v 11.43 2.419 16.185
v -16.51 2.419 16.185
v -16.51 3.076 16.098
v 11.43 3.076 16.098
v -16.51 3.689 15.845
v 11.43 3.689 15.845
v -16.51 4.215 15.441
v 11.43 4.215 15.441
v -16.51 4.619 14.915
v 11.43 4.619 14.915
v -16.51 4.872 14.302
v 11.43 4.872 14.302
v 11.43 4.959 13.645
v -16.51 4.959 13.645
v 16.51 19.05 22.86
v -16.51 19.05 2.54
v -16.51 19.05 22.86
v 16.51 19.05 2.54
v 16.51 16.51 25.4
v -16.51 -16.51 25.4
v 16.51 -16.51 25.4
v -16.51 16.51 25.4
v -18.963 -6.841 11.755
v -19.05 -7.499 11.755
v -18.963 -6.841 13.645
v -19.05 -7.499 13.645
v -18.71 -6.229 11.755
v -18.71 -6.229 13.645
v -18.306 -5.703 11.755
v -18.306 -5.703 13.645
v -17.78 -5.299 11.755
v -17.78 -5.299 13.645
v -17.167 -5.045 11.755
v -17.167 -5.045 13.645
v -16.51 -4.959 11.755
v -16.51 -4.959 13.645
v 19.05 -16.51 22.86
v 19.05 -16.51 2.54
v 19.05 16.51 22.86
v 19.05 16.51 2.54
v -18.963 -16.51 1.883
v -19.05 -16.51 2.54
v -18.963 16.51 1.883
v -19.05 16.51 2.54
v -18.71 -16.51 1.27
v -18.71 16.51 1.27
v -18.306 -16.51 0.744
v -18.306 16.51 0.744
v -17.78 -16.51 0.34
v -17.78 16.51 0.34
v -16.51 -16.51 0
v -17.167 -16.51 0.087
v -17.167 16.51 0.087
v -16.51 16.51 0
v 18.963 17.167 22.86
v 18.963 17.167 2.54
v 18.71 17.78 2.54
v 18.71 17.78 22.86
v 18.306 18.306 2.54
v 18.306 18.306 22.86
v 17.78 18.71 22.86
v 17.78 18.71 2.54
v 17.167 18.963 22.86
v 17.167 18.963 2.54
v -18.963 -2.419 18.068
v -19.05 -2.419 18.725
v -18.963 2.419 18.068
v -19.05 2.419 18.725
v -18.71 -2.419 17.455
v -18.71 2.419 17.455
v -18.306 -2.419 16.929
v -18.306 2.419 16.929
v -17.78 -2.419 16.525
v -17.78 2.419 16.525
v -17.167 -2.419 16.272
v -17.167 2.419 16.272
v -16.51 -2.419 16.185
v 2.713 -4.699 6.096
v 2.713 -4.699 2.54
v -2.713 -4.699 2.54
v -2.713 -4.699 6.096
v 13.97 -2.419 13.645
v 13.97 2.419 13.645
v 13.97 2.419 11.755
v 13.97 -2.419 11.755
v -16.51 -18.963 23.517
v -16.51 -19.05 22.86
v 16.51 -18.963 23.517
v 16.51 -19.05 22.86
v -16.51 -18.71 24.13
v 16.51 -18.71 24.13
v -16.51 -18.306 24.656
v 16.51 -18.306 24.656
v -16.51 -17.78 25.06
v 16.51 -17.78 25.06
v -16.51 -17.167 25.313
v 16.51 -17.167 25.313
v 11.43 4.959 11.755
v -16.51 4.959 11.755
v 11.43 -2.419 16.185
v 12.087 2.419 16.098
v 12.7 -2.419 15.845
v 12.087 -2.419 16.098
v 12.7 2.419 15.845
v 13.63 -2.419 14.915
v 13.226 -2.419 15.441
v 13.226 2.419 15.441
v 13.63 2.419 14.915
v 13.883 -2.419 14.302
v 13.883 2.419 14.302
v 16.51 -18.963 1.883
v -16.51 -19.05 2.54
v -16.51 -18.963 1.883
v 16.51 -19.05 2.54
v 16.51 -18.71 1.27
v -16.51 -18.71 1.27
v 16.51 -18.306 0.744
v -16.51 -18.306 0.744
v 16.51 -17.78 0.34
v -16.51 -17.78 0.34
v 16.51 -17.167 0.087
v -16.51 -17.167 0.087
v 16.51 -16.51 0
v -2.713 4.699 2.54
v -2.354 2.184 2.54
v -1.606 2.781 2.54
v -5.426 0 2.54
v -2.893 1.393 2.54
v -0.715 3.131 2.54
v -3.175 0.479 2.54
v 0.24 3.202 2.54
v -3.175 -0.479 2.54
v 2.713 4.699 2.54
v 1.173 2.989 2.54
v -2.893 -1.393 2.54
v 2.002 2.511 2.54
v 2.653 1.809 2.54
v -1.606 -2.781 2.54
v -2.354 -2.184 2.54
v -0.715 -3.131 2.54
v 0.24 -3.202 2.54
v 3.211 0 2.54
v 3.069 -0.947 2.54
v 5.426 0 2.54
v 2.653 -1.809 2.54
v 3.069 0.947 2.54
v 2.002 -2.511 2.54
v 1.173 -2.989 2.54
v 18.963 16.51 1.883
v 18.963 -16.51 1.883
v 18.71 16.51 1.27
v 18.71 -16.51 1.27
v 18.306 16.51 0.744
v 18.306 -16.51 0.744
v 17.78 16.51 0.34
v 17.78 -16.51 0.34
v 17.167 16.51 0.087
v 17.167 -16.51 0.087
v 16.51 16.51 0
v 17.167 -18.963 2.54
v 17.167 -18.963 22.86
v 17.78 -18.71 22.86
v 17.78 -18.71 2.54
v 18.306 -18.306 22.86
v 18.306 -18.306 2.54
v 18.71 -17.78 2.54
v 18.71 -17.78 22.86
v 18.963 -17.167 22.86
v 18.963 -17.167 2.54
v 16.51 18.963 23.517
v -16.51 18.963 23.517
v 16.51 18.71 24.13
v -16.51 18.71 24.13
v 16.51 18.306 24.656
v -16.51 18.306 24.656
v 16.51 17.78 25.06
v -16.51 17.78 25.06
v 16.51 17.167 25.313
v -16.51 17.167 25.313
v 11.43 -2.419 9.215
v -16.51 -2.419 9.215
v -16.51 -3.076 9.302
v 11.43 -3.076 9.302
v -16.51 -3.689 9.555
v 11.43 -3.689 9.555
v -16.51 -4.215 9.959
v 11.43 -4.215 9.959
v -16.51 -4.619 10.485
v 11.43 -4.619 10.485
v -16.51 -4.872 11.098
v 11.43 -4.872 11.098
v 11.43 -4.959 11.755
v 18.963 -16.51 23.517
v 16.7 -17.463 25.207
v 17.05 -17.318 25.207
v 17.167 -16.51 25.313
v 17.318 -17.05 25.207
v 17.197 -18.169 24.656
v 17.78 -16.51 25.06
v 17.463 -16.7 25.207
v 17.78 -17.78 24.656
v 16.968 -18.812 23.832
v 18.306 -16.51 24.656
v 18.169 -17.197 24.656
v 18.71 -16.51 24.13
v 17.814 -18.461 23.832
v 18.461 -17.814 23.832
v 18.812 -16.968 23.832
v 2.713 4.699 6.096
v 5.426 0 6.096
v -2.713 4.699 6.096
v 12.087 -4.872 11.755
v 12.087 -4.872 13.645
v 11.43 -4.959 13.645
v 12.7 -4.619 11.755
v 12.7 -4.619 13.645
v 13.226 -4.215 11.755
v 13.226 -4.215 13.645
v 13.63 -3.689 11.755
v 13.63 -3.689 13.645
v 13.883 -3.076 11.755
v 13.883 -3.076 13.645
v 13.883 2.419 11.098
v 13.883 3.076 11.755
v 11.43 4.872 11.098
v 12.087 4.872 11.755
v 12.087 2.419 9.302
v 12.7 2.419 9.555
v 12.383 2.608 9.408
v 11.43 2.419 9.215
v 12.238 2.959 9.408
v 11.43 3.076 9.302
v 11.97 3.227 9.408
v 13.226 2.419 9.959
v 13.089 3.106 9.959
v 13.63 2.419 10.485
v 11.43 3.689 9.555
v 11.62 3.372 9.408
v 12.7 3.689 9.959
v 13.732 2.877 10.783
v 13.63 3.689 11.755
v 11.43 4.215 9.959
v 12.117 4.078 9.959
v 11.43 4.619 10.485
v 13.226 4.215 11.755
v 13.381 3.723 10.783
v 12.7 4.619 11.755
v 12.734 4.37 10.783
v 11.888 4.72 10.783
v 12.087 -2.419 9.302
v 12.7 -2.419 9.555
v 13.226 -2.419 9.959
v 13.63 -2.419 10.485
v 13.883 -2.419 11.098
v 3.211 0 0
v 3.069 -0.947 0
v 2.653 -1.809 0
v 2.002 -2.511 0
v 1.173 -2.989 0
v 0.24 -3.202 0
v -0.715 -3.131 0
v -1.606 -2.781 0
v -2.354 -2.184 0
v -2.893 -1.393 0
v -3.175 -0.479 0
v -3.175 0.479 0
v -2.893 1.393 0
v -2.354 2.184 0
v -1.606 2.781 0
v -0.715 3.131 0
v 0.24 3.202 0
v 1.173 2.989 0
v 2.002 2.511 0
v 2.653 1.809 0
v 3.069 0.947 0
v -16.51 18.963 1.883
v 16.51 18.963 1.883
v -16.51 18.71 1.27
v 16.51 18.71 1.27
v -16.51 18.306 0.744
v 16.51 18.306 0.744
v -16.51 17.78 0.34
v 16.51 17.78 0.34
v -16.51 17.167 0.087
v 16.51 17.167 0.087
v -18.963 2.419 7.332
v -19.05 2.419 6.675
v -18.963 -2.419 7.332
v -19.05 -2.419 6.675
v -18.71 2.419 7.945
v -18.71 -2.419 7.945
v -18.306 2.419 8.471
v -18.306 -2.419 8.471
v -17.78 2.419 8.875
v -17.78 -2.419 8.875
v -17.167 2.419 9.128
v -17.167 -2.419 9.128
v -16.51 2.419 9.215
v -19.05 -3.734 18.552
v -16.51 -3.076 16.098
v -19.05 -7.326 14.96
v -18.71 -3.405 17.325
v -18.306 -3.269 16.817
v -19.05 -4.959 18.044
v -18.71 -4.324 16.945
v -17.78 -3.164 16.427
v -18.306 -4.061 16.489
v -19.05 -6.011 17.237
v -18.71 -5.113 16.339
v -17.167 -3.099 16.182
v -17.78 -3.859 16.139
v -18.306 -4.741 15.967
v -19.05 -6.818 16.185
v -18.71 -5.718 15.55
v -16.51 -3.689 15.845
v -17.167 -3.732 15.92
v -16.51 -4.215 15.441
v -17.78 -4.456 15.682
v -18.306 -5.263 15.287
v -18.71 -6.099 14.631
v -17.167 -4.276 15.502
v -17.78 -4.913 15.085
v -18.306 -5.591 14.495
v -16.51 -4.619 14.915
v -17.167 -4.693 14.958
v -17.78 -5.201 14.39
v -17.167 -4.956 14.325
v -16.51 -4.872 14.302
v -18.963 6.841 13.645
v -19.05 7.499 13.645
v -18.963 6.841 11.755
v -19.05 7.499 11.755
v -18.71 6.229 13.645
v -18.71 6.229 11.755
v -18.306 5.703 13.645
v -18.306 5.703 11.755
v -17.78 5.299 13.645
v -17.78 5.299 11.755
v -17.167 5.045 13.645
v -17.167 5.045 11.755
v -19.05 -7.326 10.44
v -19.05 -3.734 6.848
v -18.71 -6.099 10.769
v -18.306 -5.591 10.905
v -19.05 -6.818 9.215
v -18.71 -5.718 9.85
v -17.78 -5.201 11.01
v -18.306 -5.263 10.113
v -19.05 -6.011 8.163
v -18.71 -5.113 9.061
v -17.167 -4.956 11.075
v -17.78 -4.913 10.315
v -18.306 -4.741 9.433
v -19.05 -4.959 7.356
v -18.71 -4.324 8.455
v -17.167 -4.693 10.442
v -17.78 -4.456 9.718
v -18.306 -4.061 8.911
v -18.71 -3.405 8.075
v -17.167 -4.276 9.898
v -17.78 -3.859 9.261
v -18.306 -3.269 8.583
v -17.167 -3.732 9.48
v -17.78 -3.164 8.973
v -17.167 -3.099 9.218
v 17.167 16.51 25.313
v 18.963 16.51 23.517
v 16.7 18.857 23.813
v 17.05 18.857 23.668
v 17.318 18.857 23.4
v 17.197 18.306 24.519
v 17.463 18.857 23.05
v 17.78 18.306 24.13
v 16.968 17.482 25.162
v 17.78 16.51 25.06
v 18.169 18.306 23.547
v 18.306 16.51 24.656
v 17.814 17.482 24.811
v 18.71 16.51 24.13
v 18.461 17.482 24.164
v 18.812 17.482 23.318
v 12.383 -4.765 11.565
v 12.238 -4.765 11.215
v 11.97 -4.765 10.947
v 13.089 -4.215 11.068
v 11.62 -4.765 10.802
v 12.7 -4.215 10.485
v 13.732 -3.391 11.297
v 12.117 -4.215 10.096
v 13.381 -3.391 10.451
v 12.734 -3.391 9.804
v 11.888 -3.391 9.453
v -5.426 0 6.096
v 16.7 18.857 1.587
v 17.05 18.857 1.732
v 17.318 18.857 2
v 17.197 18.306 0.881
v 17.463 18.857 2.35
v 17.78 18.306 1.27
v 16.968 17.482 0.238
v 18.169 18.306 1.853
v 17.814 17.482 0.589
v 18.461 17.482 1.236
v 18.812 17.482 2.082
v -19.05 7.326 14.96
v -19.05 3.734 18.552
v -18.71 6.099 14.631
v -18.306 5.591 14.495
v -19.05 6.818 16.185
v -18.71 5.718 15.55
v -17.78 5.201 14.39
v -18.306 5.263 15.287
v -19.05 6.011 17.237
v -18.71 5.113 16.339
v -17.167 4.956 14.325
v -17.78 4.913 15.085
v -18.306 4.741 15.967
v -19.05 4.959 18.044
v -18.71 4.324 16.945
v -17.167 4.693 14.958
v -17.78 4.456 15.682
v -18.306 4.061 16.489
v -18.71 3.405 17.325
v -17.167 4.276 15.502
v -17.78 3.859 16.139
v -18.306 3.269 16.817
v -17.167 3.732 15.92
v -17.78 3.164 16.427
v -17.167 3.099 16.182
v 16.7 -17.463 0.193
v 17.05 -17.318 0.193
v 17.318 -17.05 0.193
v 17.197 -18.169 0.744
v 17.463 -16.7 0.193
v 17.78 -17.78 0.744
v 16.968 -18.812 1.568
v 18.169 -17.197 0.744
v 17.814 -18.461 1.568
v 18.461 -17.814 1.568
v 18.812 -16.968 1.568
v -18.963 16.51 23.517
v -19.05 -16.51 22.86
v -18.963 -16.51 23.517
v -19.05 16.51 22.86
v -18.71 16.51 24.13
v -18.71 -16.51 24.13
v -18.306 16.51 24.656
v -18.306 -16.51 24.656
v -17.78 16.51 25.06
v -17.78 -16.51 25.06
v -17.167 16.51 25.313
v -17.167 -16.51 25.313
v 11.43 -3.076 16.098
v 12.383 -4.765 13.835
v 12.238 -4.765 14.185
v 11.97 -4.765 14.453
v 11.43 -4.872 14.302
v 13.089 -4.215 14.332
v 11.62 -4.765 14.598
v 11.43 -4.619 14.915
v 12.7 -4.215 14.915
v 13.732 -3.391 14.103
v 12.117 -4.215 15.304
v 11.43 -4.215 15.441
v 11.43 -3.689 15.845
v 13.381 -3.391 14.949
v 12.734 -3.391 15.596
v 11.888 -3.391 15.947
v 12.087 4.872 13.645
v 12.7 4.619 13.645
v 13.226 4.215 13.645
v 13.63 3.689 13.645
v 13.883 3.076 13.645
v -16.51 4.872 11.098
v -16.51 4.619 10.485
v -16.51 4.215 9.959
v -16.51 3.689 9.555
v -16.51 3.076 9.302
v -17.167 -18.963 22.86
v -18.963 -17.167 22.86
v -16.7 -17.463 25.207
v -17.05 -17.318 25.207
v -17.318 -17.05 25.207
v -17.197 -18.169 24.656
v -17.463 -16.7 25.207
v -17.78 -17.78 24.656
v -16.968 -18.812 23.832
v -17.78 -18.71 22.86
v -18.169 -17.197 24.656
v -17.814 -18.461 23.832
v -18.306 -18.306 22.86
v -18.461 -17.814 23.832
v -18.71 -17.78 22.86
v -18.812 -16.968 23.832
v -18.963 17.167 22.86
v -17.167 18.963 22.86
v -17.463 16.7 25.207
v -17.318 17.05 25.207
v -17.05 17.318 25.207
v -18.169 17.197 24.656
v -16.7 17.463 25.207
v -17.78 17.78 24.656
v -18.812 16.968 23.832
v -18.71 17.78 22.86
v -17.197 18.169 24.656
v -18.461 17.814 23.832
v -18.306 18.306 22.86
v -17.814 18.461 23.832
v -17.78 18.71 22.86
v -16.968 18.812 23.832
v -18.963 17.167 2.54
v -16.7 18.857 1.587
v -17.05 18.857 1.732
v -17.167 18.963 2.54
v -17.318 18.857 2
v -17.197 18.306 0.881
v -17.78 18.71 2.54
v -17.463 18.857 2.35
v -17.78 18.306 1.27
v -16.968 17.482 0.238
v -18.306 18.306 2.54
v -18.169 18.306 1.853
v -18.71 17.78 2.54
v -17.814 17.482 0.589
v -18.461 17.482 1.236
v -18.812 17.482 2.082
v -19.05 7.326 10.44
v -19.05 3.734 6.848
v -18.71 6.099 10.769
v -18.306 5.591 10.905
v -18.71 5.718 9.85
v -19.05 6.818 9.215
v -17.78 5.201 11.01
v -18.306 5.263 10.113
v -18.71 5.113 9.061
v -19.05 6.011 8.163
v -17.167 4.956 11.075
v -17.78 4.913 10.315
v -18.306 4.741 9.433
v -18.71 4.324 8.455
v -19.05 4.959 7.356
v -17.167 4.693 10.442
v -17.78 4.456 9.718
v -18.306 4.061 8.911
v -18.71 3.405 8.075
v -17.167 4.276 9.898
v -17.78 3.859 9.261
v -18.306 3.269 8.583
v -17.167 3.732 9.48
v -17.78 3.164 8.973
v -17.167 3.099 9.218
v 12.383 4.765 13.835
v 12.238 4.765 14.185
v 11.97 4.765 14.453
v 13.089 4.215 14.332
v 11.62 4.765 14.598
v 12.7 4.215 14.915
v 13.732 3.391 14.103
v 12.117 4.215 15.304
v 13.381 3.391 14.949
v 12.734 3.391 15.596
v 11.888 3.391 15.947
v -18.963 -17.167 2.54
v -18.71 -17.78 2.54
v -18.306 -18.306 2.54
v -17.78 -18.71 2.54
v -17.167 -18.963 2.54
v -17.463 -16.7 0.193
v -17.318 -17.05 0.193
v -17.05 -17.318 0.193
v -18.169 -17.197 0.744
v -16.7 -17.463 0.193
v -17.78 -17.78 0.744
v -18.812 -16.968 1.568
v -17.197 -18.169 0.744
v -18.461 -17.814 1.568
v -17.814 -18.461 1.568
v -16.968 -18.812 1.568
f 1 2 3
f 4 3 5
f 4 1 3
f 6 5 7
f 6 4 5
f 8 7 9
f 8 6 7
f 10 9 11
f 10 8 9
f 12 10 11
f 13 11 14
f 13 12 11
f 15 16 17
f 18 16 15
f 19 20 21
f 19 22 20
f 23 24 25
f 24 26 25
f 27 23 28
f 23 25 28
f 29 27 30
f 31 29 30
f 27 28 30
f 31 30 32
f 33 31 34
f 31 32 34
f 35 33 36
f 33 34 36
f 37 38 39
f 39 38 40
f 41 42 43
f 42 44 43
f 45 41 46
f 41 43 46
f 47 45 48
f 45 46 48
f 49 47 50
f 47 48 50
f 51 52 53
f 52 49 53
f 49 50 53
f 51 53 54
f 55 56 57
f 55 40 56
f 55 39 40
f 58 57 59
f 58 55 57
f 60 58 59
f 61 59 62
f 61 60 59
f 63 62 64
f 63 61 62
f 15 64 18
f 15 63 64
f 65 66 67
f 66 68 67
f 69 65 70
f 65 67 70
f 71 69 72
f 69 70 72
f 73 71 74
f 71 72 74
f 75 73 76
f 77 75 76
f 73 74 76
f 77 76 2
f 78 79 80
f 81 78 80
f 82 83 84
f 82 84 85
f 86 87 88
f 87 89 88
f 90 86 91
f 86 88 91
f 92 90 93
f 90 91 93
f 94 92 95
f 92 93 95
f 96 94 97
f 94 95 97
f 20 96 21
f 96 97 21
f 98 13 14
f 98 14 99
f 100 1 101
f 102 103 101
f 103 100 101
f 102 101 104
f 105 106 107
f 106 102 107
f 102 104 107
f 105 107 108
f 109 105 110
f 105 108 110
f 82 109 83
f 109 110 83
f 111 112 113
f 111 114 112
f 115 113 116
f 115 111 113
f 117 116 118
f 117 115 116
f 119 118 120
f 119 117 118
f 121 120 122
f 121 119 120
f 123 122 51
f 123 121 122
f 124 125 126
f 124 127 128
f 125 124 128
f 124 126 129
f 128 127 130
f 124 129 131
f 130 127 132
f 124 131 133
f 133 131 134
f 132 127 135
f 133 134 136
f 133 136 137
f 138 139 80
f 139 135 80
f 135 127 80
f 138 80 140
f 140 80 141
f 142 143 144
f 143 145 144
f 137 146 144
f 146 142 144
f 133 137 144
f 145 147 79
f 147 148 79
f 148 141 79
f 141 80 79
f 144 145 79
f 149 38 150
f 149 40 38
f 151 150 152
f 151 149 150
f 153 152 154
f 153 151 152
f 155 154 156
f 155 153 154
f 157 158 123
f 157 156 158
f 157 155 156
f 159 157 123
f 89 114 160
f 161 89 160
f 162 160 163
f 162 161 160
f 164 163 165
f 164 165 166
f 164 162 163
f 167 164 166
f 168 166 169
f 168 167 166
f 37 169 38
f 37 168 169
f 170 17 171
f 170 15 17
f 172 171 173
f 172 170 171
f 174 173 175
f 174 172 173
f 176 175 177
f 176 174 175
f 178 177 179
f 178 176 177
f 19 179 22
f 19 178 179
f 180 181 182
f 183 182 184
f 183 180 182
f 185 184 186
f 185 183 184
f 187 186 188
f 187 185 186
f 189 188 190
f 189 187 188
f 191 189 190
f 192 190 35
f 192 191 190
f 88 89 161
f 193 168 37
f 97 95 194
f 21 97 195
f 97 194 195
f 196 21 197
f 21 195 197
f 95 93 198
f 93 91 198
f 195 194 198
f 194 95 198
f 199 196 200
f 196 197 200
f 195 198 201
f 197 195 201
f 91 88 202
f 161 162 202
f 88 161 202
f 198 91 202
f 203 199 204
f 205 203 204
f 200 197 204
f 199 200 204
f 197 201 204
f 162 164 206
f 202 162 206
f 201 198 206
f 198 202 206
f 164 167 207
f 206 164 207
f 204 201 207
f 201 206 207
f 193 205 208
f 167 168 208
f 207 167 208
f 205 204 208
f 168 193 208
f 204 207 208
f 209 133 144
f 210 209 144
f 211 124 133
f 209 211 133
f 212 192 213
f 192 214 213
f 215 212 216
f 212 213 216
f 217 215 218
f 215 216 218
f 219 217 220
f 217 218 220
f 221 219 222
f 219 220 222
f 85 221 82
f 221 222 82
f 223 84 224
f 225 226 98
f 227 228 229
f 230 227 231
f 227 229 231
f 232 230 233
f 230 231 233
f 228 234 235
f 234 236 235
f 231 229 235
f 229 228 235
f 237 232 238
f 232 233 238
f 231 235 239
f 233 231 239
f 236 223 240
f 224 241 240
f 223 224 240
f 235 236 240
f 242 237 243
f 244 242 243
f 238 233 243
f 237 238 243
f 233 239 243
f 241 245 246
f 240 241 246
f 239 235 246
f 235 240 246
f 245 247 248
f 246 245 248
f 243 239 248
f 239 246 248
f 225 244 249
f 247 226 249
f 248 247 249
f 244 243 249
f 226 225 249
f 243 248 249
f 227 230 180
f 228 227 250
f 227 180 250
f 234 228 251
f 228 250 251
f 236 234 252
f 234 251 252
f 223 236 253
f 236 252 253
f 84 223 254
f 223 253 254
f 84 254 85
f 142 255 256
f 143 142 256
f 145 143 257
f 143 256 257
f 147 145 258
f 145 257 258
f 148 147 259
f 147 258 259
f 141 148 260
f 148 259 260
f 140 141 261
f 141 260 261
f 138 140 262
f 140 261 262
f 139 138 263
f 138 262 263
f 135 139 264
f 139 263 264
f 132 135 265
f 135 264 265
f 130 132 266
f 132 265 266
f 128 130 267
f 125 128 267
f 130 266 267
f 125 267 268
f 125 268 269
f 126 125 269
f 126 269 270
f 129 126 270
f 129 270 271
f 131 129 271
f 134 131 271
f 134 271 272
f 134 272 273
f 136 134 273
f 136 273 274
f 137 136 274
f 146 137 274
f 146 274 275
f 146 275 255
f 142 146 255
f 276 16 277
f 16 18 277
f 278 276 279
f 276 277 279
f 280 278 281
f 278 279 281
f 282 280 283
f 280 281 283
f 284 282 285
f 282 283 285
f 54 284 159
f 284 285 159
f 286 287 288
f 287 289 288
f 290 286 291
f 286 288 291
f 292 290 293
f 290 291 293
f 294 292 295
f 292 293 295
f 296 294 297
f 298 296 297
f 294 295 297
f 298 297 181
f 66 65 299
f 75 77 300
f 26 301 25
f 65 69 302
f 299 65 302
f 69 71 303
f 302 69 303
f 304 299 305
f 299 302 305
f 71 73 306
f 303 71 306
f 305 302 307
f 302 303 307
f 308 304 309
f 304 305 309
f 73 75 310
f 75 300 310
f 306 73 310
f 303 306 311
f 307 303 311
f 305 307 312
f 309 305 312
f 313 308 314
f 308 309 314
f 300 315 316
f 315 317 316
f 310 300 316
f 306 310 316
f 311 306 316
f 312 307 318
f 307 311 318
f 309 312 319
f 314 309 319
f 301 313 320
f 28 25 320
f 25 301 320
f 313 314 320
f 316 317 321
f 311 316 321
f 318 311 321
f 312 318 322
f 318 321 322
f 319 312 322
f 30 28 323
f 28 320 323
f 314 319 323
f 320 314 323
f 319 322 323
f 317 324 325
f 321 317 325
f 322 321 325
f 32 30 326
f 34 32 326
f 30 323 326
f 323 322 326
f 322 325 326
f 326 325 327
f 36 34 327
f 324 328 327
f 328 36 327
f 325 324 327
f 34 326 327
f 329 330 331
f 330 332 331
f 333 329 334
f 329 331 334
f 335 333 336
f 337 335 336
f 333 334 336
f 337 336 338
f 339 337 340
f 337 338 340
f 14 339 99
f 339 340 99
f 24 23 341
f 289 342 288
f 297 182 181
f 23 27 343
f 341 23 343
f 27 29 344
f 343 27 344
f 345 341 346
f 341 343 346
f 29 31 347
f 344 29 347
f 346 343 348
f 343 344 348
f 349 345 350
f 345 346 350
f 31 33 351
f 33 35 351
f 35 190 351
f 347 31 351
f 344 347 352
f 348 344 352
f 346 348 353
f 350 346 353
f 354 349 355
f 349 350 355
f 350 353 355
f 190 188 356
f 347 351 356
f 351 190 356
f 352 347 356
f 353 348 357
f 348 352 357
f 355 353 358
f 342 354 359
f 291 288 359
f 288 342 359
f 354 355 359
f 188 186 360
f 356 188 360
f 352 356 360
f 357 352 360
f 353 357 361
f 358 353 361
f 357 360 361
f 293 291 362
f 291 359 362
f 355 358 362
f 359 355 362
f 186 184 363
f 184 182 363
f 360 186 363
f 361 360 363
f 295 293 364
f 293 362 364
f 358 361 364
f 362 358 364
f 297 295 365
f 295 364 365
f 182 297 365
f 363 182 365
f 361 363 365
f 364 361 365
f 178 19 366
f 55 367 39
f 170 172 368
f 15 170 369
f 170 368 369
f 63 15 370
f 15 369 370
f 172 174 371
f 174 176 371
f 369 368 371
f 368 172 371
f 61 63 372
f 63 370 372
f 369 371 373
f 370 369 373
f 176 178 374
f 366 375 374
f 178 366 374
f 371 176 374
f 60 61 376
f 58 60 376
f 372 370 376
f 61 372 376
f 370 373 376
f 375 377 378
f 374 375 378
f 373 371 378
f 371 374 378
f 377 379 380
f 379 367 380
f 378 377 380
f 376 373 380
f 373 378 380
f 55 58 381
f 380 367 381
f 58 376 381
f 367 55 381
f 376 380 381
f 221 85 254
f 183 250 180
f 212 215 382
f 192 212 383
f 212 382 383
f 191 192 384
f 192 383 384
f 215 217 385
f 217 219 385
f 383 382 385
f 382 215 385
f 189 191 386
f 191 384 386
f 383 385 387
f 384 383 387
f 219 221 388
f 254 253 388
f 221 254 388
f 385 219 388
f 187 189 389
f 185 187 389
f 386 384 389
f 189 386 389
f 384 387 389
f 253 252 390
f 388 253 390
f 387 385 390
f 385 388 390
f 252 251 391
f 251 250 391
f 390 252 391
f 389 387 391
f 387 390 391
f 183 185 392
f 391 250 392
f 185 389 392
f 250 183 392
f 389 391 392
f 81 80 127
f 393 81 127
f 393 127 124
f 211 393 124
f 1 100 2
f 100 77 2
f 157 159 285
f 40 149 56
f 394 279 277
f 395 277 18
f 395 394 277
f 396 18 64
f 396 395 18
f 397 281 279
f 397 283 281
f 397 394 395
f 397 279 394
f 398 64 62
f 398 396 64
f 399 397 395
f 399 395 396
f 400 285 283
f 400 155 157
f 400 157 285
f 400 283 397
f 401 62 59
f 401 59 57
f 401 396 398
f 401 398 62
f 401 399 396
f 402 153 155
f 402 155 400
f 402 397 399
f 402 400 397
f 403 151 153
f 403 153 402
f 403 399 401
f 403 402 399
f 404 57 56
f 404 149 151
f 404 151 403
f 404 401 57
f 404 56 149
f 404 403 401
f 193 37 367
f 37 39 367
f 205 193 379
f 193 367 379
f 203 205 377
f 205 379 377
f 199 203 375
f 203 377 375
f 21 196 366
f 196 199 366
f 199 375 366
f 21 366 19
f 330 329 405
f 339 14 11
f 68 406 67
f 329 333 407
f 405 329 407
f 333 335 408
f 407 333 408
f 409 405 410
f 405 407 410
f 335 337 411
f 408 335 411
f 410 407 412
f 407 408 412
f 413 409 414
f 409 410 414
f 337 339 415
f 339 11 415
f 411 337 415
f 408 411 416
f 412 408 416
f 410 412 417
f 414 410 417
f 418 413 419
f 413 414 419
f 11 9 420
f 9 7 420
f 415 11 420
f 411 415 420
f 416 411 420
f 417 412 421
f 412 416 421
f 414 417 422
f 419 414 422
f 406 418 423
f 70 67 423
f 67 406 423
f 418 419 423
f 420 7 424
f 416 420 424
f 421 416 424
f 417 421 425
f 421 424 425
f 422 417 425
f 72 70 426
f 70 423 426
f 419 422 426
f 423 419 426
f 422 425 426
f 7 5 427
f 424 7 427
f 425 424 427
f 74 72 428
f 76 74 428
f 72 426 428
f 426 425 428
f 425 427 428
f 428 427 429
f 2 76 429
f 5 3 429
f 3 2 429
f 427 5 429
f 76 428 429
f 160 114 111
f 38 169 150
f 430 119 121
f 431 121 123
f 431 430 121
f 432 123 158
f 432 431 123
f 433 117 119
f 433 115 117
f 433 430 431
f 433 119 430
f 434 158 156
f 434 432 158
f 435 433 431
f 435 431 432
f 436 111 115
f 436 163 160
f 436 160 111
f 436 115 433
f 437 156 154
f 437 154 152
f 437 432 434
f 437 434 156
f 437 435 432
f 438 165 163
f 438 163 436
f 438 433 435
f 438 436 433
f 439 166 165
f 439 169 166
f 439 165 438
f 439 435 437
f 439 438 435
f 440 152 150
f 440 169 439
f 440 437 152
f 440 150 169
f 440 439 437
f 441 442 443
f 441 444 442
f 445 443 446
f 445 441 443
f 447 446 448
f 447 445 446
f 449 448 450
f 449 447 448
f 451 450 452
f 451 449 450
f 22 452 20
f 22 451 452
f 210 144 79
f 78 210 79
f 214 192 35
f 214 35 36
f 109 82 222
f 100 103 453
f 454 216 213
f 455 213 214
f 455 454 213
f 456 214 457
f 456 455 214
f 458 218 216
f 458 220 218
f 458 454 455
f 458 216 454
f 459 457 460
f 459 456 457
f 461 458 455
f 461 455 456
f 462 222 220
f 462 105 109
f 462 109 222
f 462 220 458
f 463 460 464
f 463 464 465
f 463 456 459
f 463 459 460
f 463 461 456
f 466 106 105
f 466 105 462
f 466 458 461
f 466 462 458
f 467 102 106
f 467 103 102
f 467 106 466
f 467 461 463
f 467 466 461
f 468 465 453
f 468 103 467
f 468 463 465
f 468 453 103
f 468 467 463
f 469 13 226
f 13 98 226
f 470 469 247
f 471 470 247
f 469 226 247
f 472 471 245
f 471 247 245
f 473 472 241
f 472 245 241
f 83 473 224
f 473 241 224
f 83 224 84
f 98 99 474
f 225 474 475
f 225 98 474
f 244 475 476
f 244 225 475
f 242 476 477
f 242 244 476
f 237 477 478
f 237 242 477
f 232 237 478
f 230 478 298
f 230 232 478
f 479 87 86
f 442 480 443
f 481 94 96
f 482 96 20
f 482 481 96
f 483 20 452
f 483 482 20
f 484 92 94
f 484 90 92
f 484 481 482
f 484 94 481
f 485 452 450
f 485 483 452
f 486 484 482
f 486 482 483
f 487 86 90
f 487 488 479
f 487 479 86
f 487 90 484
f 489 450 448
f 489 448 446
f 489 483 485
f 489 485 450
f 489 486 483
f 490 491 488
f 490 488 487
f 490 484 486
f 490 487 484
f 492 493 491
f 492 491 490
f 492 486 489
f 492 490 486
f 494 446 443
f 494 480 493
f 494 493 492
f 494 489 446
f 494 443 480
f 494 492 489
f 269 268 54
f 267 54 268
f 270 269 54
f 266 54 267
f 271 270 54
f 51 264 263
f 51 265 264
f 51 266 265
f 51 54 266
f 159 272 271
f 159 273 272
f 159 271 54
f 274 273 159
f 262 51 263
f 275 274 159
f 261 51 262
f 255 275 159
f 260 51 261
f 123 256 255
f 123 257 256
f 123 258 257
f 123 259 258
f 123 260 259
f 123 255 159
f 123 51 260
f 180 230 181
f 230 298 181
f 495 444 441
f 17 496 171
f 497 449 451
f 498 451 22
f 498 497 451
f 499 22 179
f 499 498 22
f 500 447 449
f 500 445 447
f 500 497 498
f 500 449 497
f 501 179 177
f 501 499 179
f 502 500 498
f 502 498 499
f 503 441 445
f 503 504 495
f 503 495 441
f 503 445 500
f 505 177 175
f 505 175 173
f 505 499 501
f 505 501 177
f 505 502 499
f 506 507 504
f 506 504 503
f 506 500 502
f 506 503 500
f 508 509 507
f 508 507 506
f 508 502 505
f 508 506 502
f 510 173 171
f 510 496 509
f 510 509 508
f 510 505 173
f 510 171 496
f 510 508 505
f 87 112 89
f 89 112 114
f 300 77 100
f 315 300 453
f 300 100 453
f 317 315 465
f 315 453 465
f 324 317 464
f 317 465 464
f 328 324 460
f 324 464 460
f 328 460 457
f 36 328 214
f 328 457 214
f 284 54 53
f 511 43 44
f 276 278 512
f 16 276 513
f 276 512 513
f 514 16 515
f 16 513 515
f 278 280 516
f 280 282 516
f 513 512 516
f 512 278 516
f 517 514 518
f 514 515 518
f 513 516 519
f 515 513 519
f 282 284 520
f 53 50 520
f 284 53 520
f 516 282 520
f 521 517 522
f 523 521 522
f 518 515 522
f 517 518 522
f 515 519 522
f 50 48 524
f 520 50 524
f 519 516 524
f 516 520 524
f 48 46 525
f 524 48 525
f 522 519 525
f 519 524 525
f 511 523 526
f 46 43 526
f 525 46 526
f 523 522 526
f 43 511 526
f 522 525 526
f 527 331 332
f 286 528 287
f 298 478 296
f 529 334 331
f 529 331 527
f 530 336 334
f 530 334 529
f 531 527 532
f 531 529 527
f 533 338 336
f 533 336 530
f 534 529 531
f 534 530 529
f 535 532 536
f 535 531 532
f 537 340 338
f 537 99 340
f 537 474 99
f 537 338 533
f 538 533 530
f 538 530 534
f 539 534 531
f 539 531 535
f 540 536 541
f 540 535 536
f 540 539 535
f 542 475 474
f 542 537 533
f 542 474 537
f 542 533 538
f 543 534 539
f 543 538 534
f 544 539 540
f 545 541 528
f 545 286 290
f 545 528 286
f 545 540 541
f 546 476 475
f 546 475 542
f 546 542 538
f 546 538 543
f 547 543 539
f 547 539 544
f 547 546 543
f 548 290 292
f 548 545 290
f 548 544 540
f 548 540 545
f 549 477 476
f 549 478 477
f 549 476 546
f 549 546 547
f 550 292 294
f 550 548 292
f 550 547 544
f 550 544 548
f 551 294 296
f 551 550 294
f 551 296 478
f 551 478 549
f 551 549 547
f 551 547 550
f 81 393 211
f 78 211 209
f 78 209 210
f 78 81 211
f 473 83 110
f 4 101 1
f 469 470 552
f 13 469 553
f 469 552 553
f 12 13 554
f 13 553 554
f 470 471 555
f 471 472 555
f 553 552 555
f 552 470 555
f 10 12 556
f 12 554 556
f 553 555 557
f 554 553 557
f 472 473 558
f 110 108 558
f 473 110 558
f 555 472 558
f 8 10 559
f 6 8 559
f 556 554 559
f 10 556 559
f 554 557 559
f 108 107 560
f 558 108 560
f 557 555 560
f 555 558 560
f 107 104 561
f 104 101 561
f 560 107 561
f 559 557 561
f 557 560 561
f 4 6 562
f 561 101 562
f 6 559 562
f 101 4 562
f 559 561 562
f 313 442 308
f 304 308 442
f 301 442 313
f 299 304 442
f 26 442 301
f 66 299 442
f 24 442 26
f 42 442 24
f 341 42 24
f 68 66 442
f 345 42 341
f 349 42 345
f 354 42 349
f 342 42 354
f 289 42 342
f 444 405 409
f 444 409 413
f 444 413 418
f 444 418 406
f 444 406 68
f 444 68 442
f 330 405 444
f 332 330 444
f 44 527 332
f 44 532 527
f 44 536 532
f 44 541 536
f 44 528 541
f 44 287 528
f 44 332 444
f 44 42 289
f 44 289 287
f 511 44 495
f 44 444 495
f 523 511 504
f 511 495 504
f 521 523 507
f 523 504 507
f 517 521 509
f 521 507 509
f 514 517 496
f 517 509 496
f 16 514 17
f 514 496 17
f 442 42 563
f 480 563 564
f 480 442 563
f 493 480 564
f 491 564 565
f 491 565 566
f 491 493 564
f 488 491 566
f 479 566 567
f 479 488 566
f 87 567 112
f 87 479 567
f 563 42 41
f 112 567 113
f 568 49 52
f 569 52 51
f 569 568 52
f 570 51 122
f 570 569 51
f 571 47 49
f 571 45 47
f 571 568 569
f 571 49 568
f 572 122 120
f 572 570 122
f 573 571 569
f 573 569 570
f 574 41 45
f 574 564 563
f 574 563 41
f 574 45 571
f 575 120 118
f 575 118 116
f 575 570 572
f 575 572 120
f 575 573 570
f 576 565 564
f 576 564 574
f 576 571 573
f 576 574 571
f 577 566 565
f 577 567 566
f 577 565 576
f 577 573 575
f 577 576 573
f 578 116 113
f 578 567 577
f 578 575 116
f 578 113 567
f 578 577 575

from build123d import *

# Parameters (mm, degrees)
F0_W      = 38.1
F0_H      = 38.1
F1_DEPTH  = 25.4
F2_R      = 2.54
F4_DEPTH  = 33.02
F6_DEPTH  = 6.096
F7_DEPTH  = 2.54
F8_R      = 2.54
F9_R      = 3.211175
F10_DEPTH = 5.08


with BuildPart() as f1:
    # F0 (on Top) → F1 (new body)
    with BuildSketch(Plane.XY):
        Rectangle(F0_W, F0_H)
    extrude(amount=F1_DEPTH)

    # F2
    f2_edges = [f1.edges().sort_by_distance(p)[0] for p in [
        (-19.05, -19.05, 12.7),
        (-19.05, 0, 0),
        (19.05, -19.05, 12.7),
        (0, -19.05, 0),
        (0, -19.05, 25.4),
        (19.05, 0, 0),
        (0, 19.05, 0),
        (-19.05, 19.05, 12.7),
        (-19.05, 0, 25.4),
        (19.05, 0, 25.4),
        (0, 19.05, 25.4),
        (19.05, 19.05, 12.7),
    ]]
    fillet(f2_edges, radius=F2_R)

    # F3 (on face) → F4 (cut)
    with BuildSketch(Plane(origin=(-19.05, 0, 0), x_dir=(0, -1, 0), z_dir=(-1, 0, 0))):
        Polygon((4.958837, 16.184959), (0, 16.184959), (0, 12.7), (0, 9.215041), (4.958837, 9.215041), align=None)
        Polygon((0, 16.184959), (-4.958837, 16.184959), (-4.958837, 9.215041), (0, 9.215041), (0, 12.7), align=None)
    extrude(amount=-F4_DEPTH, mode=Mode.SUBTRACT)

    # F5 (on face) → F6 (cut)
    with BuildSketch(Plane(origin=(0, 0, 0), x_dir=(1, 0, 0), z_dir=(0, 0, -1))):
        Polygon((-2.712969, -4.699), (2.712969, -4.699), (5.425938, 0), (2.712969, 4.699), (-2.712969, 4.699), (-5.425938, 0), align=None)
    extrude(amount=-F6_DEPTH, mode=Mode.SUBTRACT)

    # F5 (on face) → F7 (join)
    with BuildSketch(Plane(origin=(0, 0, 0), x_dir=(1, 0, 0), z_dir=(0, 0, -1))):
        Polygon((-2.712969, -4.699), (2.712969, -4.699), (5.425938, 0), (2.712969, 4.699), (-2.712969, 4.699), (-5.425938, 0), align=None)
    extrude(amount=-F7_DEPTH)

    # F8
    f8_edges = [f1.edges().sort_by_distance(p)[0] for p in [
        (13.97, 0, 16.184959),
        (13.97, 4.958837, 12.7),
        (13.97, 0, 9.215041),
        (13.97, -4.958837, 12.7),
        (-2.54, 4.958837, 16.184959),
        (-2.54, 4.958837, 9.215041),
        (-19.05, 4.958837, 12.7),
        (-2.54, -4.958837, 16.184959),
        (-19.05, 0, 16.184959),
        (-2.54, -4.958837, 9.215041),
        (-19.05, -4.958837, 12.7),
        (-19.05, 0, 9.215041),
    ]]
    fillet(f8_edges, radius=F8_R)

    # F9 (on face) → F10 (cut)
    with BuildSketch(Plane(origin=(0, 0, 0), x_dir=(1, 0, 0), z_dir=(0, 0, -1))):
        Circle(F9_R)
    extrude(amount=-F10_DEPTH, mode=Mode.SUBTRACT)


solid = f1.part
